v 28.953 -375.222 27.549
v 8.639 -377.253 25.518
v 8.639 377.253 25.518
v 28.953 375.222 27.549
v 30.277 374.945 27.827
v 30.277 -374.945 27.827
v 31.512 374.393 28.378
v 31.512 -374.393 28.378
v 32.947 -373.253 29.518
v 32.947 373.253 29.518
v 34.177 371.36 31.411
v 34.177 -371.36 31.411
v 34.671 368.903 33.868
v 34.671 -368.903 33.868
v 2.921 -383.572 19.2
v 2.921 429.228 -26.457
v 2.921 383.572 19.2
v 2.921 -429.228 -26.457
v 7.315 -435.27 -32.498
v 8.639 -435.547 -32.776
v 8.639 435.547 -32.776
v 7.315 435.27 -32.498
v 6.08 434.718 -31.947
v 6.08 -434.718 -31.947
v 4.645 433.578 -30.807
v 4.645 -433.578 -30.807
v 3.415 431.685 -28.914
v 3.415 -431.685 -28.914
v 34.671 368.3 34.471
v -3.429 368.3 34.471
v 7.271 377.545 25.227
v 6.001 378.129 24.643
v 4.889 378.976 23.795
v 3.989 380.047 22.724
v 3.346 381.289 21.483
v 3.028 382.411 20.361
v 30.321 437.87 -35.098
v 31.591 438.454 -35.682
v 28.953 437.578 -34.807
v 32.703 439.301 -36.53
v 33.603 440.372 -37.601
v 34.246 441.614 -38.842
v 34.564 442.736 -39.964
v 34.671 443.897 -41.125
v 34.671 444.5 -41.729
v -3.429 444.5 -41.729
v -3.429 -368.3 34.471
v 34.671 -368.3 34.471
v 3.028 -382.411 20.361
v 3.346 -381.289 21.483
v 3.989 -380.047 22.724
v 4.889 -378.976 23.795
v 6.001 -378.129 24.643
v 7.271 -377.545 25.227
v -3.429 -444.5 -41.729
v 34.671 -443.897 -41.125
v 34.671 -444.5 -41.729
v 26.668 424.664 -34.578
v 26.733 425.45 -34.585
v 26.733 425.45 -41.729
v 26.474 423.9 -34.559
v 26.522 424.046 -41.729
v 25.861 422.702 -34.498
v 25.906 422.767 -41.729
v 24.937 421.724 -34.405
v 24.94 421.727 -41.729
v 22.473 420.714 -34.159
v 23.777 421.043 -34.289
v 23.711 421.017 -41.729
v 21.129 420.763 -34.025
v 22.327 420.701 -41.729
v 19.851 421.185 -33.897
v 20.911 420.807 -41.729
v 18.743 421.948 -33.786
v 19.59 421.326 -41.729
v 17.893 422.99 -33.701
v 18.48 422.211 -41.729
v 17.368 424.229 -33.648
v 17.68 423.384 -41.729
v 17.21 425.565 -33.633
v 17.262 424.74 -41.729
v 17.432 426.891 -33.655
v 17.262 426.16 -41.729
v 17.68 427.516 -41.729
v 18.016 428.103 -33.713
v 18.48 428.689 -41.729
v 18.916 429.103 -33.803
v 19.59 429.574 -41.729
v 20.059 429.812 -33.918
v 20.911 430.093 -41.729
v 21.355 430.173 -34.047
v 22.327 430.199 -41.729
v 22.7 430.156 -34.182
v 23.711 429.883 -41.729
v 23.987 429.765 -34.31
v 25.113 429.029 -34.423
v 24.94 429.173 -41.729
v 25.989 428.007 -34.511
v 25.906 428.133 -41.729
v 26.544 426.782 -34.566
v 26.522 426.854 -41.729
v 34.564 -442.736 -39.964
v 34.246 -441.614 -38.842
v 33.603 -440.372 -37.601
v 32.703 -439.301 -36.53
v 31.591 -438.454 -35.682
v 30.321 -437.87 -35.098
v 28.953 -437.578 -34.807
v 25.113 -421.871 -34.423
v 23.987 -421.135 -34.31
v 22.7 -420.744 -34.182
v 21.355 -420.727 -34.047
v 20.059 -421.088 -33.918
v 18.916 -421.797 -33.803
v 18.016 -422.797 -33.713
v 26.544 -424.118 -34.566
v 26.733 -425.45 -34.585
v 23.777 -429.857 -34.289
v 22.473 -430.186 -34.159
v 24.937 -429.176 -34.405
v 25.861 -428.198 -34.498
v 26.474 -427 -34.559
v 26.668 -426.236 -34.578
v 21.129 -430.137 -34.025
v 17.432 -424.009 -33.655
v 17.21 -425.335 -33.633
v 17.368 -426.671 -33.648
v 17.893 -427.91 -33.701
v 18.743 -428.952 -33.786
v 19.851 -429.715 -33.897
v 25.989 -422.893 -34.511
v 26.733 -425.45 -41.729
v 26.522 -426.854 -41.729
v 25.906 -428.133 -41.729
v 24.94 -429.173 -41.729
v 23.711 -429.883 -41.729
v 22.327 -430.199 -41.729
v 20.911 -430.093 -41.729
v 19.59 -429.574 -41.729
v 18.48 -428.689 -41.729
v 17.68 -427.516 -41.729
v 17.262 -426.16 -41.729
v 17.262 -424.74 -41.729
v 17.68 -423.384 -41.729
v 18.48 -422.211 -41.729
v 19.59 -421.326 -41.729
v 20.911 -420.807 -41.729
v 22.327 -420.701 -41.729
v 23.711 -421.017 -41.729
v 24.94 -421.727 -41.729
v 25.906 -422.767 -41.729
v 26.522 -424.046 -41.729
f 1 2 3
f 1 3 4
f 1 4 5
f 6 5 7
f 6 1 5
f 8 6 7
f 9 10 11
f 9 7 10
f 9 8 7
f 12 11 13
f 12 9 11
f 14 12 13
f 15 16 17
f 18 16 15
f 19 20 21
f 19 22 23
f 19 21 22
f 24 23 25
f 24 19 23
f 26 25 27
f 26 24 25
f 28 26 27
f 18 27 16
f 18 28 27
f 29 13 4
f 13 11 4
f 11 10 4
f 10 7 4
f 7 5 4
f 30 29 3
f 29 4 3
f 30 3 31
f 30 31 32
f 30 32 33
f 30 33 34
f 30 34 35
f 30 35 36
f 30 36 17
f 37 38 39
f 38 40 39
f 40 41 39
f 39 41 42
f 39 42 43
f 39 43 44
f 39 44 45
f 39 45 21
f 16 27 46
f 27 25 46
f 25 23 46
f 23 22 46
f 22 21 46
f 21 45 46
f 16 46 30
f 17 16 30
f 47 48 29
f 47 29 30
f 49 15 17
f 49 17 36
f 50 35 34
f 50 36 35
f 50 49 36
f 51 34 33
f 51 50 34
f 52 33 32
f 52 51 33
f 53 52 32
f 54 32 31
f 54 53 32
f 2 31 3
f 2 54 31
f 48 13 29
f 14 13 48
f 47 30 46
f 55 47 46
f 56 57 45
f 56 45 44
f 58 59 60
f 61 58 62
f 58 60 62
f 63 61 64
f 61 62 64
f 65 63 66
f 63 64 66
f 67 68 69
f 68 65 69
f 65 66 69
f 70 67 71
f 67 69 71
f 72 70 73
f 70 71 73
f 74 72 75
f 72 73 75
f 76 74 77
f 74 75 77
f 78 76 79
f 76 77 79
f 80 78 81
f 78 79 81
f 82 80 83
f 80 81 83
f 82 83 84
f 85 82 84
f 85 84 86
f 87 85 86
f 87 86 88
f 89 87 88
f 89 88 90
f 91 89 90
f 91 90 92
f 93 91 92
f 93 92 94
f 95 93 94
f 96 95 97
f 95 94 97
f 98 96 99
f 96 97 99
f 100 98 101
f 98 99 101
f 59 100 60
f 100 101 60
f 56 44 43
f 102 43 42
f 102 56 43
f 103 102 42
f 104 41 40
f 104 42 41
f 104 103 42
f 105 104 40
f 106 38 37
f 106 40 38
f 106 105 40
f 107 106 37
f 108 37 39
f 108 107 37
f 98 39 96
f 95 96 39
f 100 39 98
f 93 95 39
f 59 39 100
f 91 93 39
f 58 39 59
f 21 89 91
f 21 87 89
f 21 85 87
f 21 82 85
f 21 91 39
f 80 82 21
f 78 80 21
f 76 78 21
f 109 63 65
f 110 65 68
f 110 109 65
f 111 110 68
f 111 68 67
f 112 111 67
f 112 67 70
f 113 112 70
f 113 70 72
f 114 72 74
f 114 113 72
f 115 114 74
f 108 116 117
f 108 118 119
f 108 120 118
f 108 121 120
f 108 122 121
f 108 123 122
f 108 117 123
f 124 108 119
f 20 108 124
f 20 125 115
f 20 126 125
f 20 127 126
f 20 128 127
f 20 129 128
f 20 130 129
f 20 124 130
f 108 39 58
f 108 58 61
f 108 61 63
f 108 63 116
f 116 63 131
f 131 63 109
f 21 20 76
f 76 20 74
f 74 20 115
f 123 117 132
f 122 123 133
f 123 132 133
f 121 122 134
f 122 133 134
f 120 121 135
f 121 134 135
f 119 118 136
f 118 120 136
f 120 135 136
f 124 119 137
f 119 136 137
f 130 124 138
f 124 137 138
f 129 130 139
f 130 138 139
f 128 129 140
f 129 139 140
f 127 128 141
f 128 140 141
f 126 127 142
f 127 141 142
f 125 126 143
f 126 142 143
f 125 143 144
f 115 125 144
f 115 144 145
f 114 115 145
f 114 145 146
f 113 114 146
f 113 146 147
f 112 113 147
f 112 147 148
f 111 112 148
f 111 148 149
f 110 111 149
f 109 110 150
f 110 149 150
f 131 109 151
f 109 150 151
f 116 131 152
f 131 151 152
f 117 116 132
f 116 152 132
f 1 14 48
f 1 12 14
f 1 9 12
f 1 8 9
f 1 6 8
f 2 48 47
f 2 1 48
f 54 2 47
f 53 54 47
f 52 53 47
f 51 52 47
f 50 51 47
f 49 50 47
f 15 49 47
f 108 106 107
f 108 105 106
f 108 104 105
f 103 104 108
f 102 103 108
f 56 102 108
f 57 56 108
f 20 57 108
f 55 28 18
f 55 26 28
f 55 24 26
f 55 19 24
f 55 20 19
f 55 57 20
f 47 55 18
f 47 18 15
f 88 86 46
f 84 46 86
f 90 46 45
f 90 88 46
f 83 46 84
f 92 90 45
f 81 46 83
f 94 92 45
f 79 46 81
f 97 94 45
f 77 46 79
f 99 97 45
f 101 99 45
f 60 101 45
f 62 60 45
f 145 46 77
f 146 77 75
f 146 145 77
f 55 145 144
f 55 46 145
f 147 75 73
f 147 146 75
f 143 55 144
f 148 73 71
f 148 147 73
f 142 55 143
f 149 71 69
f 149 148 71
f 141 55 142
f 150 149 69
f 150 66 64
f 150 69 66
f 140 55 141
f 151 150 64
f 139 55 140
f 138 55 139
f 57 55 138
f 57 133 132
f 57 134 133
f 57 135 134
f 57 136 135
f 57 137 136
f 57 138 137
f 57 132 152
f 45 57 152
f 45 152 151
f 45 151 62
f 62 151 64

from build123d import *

# Parameters (mm, degrees)
F1_DEPTH = 444.5
F2_SIZE  = 76.19999
F3_SIZE  = 76.19999
F4_R     = 4.7625
F5_DEPTH = 25.4
F6_DEPTH = 25.4


# Not quite as in the source:
# - a fillet or chamfer is up to 0.001 mm smaller than in the source, because OpenCascade refuses the exact size


with BuildPart() as f1:
    # F0 (on Front) → F1 (new body, symmetric)
    with BuildSketch(Plane.XZ):
        with BuildLine():
            Line((34.6709999669, 34.4712352276), (-3.4290000331, 34.4712352276))
            Line((-3.4290000331, 34.4712352276), (-3.4290000331, -41.7287647724))
            Line((-3.4290000331, -41.7287647724), (34.6709999669, -41.7287647724))
            Line((34.6709999669, -41.7287647724), (34.6709999669, -41.1254357918))
            ThreePointArc((34.6709999669, -41.1254357918), (33.029223555, -36.864552005), (28.9528485827, -34.806949634))
            Line((28.9528485827, -34.806949634), (8.6391513512, -32.7755799108))
            ThreePointArc((8.6391513512, -32.7755799108), (4.5627763789, -30.7179775398), (2.9209999669, -26.457093753))
            Line((2.9209999669, -26.457093753), (2.9209999669, 19.1995642082))
            ThreePointArc((2.9209999669, 19.1995642082), (4.5627763789, 23.460447995), (8.6391513512, 25.518050366))
            Line((8.6391513512, 25.518050366), (28.9528485827, 27.5494200892))
            ThreePointArc((28.9528485827, 27.5494200892), (33.029223555, 29.6070224602), (34.6709999669, 33.867906247))
            Line((34.6709999669, 33.867906247), (34.6709999669, 34.4712352276))
        make_face()
    extrude(amount=F1_DEPTH, both=True)

    # F2 (size 76.2 in the source; OpenCascade refuses exactly that, so slightly less here)
    f2_edges = [f1.edges().sort_by_distance(p)[0] for p in [
        (15.621, -444.5, 34.471235),
    ]]
    chamfer(f2_edges, length=F2_SIZE)

    # F3 (size 76.2 in the source; OpenCascade refuses exactly that, so slightly less here)
    f3_edges = [f1.edges().sort_by_distance(p)[0] for p in [
        (15.621, 444.5, 34.471235),
    ]]
    chamfer(f3_edges, length=F3_SIZE)

    # F4 (on face) → F5 (cut)
    with BuildSketch(Plane(origin=(0, 0, -41.7287647724), x_dir=(1, 0, 0), z_dir=(0, 0, -1))):
        with Locations((21.9709999669, 425.45)):
            Circle(F4_R)
    extrude(amount=-F5_DEPTH, mode=Mode.SUBTRACT)

    # F4 (on face) → F6 (cut)
    with BuildSketch(Plane(origin=(0, 0, -41.7287647724), x_dir=(1, 0, 0), z_dir=(0, 0, -1))):
        with Locations((21.9709999669, 425.45)):
            Circle(F4_R)
        with Locations((21.9709999669, -425.45)):
            Circle(F4_R)
    extrude(amount=-F6_DEPTH, mode=Mode.SUBTRACT)


solid = f1.part
